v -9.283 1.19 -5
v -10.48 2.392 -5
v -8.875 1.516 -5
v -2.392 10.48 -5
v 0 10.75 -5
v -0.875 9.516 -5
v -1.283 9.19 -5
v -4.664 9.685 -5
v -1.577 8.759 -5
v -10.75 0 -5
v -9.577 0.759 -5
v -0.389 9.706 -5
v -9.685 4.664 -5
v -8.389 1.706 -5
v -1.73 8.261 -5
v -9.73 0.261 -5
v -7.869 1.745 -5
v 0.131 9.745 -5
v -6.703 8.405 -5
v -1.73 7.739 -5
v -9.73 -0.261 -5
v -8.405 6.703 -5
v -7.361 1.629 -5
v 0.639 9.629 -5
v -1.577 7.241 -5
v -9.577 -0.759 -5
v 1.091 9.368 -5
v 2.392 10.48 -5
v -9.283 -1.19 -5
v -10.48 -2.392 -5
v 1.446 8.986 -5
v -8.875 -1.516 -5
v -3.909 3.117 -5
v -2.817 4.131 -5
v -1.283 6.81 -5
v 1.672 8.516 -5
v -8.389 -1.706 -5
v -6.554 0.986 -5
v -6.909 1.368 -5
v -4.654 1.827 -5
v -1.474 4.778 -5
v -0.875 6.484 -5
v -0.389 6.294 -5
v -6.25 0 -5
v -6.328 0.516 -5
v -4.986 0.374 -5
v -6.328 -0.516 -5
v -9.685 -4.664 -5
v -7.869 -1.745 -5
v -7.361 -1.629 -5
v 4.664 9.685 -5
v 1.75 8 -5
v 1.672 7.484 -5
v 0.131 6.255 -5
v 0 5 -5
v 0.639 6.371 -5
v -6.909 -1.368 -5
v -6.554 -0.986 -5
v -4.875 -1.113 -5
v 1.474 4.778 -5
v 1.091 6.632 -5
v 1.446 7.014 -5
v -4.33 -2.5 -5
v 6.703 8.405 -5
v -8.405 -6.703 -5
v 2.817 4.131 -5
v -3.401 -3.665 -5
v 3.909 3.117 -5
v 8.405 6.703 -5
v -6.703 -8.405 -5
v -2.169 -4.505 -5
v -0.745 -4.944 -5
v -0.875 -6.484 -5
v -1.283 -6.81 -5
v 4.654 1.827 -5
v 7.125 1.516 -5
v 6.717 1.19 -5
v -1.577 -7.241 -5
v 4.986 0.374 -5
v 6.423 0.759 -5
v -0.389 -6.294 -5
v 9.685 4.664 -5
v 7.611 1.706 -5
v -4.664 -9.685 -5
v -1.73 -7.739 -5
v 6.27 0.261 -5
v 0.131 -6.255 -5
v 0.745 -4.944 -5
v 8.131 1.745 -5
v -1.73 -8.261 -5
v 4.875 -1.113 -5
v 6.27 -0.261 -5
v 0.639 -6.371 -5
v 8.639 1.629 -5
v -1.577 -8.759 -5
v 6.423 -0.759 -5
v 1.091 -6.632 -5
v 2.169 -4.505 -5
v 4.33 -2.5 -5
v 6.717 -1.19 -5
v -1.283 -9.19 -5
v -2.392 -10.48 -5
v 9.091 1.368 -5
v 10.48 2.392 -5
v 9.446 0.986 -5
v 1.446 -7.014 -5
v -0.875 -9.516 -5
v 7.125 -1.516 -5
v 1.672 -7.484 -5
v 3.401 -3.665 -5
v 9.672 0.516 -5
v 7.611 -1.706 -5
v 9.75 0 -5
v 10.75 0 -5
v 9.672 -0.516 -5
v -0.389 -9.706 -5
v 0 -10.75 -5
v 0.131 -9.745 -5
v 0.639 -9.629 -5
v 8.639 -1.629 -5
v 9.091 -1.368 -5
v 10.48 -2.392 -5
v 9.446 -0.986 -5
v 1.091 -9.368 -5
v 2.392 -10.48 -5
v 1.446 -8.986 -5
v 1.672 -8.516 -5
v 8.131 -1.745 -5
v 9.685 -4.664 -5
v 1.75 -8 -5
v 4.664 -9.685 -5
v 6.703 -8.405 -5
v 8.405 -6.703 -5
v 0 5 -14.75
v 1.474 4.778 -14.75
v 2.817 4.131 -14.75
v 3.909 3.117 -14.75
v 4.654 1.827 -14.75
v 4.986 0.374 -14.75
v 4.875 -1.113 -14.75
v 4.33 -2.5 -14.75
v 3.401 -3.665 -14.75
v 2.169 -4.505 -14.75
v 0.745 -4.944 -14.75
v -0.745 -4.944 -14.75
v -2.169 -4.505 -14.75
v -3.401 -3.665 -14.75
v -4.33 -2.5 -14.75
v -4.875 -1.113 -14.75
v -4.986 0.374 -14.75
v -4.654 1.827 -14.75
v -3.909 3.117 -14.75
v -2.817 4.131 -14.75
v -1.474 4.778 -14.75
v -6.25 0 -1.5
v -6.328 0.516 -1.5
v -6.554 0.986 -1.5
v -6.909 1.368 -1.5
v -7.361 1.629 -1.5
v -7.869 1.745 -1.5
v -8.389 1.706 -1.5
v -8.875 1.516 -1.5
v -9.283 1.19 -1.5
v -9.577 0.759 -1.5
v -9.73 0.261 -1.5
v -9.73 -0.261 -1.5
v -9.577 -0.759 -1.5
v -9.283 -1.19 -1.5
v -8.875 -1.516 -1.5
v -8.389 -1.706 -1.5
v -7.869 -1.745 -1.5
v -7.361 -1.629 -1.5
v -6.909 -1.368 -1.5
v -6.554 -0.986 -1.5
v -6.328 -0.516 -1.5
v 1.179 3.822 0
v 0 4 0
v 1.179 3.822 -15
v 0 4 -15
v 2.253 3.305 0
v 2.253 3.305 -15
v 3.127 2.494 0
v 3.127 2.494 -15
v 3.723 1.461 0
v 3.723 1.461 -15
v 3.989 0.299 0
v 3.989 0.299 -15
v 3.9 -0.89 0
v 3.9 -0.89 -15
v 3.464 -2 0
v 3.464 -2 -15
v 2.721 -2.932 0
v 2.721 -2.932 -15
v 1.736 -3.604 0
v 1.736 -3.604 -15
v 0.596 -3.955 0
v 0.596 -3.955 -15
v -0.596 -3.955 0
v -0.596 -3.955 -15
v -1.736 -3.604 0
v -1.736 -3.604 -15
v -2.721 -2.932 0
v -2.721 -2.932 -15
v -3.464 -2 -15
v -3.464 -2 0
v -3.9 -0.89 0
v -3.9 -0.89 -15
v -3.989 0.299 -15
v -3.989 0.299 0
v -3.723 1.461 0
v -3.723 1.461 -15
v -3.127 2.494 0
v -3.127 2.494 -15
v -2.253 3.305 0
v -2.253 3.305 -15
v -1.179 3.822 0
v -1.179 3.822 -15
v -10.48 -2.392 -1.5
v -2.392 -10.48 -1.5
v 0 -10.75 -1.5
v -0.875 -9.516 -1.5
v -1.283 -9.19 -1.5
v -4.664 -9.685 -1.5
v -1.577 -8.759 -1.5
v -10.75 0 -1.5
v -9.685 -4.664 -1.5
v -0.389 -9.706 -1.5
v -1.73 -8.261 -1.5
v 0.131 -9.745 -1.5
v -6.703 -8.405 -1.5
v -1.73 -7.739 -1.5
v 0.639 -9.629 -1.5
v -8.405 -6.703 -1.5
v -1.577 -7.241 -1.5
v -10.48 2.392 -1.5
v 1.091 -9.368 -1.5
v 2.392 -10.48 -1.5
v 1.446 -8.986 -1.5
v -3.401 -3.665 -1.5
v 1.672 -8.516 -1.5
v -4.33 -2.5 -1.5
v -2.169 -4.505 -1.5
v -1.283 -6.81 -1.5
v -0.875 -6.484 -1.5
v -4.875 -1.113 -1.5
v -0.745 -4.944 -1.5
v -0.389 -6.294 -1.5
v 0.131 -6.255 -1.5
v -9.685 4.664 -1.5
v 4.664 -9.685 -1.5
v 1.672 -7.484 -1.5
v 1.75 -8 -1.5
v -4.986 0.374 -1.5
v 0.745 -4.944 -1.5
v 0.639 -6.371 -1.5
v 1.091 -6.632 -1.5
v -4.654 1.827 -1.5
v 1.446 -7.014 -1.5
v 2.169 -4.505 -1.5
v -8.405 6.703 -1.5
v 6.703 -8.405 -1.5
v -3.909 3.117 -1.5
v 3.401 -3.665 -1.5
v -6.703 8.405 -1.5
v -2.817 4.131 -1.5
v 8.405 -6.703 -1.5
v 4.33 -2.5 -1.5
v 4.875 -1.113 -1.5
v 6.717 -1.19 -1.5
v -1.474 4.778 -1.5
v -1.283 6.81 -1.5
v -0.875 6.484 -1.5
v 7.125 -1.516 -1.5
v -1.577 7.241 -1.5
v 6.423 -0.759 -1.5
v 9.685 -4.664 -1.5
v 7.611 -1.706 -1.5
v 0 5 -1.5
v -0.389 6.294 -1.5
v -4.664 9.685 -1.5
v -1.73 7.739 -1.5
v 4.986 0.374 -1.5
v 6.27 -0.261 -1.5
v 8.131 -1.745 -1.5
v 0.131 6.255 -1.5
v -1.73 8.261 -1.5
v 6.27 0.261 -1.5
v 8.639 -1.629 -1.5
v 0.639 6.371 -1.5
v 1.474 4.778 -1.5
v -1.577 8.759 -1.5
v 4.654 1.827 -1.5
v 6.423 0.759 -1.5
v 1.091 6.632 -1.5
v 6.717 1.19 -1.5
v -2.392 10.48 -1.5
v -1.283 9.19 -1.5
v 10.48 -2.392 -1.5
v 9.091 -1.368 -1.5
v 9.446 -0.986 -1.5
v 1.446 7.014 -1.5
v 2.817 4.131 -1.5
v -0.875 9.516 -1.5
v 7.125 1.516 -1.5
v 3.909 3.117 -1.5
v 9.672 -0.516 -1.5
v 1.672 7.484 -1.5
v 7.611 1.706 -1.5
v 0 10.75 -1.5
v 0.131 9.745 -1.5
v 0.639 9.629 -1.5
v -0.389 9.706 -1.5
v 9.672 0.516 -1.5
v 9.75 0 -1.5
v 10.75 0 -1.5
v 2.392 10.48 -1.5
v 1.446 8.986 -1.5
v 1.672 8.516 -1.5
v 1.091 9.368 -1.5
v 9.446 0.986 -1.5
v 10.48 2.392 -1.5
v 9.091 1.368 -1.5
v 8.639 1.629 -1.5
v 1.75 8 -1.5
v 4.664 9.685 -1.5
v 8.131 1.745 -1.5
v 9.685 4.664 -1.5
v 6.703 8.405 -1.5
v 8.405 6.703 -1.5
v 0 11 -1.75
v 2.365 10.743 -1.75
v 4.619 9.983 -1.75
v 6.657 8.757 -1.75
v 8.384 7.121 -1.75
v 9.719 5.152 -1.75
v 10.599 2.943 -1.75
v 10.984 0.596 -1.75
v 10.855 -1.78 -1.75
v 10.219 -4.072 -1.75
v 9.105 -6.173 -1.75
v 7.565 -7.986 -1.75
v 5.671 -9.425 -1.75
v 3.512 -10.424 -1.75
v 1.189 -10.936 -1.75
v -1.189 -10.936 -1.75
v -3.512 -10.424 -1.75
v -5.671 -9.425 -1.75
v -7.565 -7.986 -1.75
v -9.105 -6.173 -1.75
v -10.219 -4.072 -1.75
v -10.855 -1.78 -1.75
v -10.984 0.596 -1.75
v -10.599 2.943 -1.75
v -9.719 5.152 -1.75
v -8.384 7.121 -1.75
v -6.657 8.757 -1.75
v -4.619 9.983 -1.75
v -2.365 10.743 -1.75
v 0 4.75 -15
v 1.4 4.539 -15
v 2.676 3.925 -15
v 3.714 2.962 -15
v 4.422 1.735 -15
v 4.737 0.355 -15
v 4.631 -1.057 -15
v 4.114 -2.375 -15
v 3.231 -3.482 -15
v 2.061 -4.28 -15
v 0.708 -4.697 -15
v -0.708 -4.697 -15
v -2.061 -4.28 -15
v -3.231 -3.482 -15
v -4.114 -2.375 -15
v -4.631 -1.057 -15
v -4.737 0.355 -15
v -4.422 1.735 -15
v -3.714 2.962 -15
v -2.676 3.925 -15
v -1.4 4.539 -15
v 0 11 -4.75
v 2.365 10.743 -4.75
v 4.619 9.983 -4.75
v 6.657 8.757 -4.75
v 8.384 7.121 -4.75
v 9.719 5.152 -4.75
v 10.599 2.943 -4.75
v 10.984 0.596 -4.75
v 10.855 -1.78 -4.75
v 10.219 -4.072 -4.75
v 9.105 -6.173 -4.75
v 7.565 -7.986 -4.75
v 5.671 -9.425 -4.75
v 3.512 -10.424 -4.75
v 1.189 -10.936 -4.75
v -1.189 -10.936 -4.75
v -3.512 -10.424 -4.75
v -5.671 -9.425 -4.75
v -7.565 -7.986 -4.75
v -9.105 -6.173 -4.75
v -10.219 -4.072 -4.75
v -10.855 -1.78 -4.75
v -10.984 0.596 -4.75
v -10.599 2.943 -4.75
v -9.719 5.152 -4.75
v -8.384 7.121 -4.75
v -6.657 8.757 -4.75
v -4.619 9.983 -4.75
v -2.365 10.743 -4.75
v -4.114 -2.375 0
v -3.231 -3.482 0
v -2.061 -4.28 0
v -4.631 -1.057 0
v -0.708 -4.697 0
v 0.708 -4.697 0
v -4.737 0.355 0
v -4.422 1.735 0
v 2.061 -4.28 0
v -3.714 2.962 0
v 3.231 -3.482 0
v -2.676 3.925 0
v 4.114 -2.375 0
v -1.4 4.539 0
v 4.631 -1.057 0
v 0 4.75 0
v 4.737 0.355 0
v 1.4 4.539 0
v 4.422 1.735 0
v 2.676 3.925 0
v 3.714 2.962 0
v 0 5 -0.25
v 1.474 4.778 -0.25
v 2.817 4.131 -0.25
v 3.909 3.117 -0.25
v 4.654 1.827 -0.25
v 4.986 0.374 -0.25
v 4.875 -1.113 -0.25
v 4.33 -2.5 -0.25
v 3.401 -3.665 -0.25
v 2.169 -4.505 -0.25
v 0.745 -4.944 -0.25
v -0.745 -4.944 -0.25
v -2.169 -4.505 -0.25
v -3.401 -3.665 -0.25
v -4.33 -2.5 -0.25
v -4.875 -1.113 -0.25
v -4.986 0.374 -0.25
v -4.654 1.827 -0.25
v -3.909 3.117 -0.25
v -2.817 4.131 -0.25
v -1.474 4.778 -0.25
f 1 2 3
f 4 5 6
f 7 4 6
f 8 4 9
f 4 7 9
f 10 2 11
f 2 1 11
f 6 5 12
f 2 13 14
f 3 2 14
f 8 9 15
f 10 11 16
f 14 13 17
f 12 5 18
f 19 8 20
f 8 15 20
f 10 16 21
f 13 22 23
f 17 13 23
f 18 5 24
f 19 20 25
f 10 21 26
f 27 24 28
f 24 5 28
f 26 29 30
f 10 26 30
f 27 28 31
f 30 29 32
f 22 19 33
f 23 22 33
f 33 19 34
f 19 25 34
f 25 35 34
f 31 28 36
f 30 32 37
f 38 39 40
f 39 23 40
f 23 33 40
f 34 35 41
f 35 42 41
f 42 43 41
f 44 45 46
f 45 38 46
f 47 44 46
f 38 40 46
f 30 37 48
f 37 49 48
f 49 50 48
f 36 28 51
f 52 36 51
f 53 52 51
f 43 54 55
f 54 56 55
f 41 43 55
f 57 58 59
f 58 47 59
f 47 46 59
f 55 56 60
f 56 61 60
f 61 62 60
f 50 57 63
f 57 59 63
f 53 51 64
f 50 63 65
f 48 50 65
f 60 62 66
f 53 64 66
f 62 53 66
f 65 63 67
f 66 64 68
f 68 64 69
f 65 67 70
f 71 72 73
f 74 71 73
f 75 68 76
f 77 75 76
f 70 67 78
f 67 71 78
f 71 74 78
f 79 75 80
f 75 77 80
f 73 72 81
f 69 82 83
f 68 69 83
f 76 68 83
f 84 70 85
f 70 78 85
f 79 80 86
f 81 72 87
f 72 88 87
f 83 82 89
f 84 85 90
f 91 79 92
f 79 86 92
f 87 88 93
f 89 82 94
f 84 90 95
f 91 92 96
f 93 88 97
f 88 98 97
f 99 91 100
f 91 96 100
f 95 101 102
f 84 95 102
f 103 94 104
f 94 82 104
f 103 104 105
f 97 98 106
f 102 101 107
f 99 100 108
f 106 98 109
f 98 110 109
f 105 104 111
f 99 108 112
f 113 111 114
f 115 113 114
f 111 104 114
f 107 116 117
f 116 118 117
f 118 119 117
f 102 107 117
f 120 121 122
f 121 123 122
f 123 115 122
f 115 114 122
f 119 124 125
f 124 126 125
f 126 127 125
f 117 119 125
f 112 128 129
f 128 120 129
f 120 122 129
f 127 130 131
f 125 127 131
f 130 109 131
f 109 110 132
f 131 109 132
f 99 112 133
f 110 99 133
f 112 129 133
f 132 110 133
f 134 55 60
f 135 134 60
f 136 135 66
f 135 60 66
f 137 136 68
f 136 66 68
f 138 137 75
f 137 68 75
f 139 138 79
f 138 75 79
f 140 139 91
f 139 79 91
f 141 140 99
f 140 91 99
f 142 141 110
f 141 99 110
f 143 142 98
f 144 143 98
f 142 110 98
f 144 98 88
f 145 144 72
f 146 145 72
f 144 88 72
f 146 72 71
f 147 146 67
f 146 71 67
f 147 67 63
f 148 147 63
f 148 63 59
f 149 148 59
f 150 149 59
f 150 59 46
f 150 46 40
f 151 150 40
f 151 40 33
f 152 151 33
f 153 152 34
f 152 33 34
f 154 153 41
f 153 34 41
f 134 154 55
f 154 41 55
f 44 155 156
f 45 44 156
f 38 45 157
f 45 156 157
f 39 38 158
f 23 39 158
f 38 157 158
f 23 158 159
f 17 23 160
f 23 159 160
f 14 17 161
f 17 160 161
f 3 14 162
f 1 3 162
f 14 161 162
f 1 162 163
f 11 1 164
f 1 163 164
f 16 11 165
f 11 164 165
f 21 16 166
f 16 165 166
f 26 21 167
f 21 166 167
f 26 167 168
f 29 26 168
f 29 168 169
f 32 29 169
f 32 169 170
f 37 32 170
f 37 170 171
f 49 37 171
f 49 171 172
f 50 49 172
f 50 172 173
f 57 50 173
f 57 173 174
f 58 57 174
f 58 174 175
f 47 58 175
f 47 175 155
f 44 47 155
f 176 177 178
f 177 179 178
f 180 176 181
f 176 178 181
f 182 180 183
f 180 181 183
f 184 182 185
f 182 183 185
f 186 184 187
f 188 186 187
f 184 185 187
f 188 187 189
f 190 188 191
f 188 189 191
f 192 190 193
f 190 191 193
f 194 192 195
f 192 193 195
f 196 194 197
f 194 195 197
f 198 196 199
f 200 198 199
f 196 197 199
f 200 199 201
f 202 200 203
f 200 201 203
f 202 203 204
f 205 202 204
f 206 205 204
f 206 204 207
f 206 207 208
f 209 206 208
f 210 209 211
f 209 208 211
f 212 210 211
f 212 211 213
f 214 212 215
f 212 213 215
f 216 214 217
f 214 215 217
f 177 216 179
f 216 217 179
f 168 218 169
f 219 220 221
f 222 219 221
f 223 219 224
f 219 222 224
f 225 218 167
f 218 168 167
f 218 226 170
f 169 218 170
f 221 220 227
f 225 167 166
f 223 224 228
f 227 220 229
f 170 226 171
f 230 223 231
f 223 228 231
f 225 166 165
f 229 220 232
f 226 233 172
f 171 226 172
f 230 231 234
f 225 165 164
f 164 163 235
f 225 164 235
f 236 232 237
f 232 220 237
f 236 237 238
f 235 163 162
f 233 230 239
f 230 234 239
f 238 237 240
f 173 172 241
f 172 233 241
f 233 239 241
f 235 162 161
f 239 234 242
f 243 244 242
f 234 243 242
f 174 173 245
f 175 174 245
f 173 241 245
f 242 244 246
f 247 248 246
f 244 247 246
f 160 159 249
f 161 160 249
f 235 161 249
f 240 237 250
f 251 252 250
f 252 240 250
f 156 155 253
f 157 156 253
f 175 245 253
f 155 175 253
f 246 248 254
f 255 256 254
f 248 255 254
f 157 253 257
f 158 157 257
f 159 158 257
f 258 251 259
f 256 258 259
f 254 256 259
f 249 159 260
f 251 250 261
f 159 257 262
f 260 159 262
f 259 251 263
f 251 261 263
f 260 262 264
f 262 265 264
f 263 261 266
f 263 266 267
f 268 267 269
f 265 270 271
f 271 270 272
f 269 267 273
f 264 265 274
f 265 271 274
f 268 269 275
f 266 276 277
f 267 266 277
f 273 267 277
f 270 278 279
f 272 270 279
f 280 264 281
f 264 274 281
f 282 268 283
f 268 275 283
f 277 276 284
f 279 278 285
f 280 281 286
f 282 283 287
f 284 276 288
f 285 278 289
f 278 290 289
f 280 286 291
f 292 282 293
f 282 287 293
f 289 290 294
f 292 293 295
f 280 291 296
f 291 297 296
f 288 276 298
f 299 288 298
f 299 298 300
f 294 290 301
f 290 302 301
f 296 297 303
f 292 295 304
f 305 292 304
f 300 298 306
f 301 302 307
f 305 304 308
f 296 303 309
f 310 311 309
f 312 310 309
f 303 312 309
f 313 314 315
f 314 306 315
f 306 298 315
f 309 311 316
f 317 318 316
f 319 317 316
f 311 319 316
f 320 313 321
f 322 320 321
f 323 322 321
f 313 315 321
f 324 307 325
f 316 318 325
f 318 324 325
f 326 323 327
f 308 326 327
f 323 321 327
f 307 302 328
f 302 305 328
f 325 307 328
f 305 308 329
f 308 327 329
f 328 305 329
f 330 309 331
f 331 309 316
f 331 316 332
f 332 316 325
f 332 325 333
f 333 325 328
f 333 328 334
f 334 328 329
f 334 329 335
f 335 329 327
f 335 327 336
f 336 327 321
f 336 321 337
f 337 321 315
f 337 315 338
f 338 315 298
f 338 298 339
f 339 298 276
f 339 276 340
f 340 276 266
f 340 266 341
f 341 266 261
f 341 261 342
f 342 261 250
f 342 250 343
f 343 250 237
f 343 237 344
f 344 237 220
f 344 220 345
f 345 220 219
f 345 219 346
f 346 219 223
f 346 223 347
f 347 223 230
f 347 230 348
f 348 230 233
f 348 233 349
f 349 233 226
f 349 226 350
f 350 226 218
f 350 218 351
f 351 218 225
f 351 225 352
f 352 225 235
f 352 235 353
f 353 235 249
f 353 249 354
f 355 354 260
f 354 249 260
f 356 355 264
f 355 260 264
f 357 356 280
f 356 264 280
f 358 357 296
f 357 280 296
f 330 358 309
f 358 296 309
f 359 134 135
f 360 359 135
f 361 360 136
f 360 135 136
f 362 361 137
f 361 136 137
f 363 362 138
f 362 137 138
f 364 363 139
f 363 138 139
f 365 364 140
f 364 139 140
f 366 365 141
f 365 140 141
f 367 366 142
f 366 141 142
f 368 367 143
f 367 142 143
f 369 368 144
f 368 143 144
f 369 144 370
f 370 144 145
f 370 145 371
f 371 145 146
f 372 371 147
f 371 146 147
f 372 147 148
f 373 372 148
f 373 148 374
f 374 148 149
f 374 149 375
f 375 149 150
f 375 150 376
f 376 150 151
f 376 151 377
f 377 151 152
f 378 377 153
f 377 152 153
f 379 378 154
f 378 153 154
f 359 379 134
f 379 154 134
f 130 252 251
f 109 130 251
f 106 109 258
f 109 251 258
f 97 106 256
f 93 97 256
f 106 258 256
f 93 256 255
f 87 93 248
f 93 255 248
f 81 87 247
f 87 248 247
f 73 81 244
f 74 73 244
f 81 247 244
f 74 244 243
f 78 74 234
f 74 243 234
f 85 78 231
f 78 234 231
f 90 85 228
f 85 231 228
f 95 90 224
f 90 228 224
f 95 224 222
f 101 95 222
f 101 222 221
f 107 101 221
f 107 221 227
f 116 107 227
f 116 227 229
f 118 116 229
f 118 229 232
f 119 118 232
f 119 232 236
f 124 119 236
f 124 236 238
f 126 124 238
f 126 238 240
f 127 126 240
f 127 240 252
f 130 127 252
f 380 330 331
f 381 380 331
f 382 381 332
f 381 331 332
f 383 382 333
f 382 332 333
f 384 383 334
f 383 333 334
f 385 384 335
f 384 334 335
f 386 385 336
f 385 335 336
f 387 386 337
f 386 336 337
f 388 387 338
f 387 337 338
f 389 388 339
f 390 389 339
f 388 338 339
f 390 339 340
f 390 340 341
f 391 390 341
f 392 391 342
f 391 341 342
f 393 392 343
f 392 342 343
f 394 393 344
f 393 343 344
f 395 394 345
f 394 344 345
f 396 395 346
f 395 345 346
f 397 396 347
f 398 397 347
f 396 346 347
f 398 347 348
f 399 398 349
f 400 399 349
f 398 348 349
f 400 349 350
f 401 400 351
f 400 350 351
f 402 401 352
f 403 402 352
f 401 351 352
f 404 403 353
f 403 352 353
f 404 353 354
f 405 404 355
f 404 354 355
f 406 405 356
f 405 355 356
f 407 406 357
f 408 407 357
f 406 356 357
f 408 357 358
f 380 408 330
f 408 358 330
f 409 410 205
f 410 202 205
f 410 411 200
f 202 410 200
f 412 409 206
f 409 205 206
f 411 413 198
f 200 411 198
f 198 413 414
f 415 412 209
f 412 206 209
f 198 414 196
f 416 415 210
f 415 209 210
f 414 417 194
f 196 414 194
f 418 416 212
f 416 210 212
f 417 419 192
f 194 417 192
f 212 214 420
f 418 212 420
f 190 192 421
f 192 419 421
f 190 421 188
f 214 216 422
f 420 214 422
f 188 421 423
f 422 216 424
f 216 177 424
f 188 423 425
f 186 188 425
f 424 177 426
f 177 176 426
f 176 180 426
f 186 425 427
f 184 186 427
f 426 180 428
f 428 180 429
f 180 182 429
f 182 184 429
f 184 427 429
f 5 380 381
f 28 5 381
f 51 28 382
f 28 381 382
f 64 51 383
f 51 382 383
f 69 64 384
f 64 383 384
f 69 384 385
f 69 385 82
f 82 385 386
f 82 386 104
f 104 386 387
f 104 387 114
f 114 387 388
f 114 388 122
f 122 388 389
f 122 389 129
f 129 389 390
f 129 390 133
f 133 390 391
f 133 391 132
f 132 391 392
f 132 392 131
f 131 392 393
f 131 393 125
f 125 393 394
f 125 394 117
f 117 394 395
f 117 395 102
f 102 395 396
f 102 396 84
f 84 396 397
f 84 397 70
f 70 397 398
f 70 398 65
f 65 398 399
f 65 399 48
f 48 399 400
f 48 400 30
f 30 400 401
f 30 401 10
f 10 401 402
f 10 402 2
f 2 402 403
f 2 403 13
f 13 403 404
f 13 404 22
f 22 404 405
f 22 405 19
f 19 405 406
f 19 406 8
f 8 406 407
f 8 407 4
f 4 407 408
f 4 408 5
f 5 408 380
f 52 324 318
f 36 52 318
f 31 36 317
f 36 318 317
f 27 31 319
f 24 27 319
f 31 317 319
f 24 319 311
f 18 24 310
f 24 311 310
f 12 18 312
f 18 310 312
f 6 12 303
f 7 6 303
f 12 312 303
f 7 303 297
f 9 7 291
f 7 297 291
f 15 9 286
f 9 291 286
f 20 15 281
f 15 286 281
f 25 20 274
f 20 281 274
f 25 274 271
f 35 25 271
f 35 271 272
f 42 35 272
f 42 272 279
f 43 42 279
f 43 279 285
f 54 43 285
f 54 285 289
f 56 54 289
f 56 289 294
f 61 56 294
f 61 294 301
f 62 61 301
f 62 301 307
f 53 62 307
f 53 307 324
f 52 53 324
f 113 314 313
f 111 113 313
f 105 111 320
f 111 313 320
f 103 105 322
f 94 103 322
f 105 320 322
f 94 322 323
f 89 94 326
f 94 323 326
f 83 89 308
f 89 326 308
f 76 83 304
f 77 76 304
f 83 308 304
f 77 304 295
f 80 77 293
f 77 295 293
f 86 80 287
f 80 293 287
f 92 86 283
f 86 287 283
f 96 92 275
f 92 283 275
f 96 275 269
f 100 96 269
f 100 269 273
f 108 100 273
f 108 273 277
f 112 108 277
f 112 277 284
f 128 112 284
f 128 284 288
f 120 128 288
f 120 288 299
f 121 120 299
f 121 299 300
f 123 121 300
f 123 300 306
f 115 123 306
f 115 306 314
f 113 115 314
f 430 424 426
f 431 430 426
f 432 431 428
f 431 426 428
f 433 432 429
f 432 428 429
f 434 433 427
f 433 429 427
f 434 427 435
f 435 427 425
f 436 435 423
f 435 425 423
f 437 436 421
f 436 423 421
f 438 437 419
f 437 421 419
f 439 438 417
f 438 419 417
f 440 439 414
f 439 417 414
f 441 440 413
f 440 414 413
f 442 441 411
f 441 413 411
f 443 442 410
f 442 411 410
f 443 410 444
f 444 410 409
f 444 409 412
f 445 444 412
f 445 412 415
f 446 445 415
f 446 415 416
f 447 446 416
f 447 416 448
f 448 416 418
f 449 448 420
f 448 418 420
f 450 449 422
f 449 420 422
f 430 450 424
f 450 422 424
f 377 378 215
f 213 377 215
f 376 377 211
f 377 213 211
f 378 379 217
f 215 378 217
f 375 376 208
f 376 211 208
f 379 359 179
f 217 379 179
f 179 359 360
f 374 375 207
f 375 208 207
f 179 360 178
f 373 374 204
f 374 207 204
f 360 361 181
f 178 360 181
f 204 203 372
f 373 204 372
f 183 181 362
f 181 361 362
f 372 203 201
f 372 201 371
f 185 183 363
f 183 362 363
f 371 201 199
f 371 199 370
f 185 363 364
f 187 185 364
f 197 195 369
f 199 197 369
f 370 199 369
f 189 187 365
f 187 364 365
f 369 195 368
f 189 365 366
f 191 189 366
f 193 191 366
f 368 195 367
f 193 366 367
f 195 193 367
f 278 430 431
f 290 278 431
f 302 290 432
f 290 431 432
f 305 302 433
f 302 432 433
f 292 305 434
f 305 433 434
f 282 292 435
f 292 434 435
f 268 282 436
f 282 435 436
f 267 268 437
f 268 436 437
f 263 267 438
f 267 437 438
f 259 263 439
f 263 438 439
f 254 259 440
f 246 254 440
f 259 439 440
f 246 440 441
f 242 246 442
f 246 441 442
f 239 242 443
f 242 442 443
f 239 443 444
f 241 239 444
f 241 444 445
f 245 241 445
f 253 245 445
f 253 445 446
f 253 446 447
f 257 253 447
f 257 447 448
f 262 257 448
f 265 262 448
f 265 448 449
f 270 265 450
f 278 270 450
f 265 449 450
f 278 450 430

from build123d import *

# Parameters (mm, degrees)
CHAMFER1_SIZE      = 0.25
CUT_EXTRUDE1_REACH = 15.5
SKETCH2_R          = 1.75


with BuildPart() as part:
    # Sketch1 → Revolve1 (revolve)
    with BuildSketch(Plane(origin=(0, 0, 0), x_dir=(0, 0, -1), z_dir=(1, 0, 0))):
        Polygon((0, 4), (15, 4), (15, 5), (5, 5), (5, 11), (1.5, 11), (1.5, 5), (0, 5), align=None)
    revolve(axis=Axis((0, 0, 903.973270396), (0, 0, -1)))

    # Chamfer1
    chamfer1_edges = [part.edges().sort_by_distance(p)[0] for p in [
        (0, -5, 0),
        (0, -11, -1.5),
        (0, -11, -5),
        (0, -5, -15),
    ]]
    chamfer(chamfer1_edges, length=CHAMFER1_SIZE)

    # Sketch2 → Cut-Extrude1 (cut, up to next)
    with BuildSketch(Plane.XY.offset(-1.5), mode=Mode.PRIVATE) as cut_extrude1_sk1:
        with Locations((0, 8)):
            Circle(SKETCH2_R)
    cut_extrude1_tool1 = extrude(cut_extrude1_sk1.sketch, amount=-CUT_EXTRUDE1_REACH, mode=Mode.PRIVATE) & part.part
    add(cut_extrude1_tool1.solids().sort_by_distance((0, 8, -1.5))[0], mode=Mode.SUBTRACT)
    # Sketch2 → Cut-Extrude1 (cut, up to next)
    with BuildSketch(Plane.XY.offset(-1.5), mode=Mode.PRIVATE) as cut_extrude1_sk2:
        with Locations((8, 0)):
            Circle(SKETCH2_R)
    cut_extrude1_tool2 = extrude(cut_extrude1_sk2.sketch, amount=-CUT_EXTRUDE1_REACH, mode=Mode.PRIVATE) & part.part
    add(cut_extrude1_tool2.solids().sort_by_distance((8, 0, -1.5))[0], mode=Mode.SUBTRACT)
    # Sketch2 → Cut-Extrude1 (cut, up to next)
    with BuildSketch(Plane.XY.offset(-1.5), mode=Mode.PRIVATE) as cut_extrude1_sk3:
        with Locations((0, -8)):
            Circle(SKETCH2_R)
    cut_extrude1_tool3 = extrude(cut_extrude1_sk3.sketch, amount=-CUT_EXTRUDE1_REACH, mode=Mode.PRIVATE) & part.part
    add(cut_extrude1_tool3.solids().sort_by_distance((0, -8, -1.5))[0], mode=Mode.SUBTRACT)
    # Sketch2 → Cut-Extrude1 (cut, up to next)
    with BuildSketch(Plane.XY.offset(-1.5), mode=Mode.PRIVATE) as cut_extrude1_sk4:
        with Locations((-8, 0)):
            Circle(SKETCH2_R)
    cut_extrude1_tool4 = extrude(cut_extrude1_sk4.sketch, amount=-CUT_EXTRUDE1_REACH, mode=Mode.PRIVATE) & part.part
    add(cut_extrude1_tool4.solids().sort_by_distance((-8, 0, -1.5))[0], mode=Mode.SUBTRACT)


solid = part.part
